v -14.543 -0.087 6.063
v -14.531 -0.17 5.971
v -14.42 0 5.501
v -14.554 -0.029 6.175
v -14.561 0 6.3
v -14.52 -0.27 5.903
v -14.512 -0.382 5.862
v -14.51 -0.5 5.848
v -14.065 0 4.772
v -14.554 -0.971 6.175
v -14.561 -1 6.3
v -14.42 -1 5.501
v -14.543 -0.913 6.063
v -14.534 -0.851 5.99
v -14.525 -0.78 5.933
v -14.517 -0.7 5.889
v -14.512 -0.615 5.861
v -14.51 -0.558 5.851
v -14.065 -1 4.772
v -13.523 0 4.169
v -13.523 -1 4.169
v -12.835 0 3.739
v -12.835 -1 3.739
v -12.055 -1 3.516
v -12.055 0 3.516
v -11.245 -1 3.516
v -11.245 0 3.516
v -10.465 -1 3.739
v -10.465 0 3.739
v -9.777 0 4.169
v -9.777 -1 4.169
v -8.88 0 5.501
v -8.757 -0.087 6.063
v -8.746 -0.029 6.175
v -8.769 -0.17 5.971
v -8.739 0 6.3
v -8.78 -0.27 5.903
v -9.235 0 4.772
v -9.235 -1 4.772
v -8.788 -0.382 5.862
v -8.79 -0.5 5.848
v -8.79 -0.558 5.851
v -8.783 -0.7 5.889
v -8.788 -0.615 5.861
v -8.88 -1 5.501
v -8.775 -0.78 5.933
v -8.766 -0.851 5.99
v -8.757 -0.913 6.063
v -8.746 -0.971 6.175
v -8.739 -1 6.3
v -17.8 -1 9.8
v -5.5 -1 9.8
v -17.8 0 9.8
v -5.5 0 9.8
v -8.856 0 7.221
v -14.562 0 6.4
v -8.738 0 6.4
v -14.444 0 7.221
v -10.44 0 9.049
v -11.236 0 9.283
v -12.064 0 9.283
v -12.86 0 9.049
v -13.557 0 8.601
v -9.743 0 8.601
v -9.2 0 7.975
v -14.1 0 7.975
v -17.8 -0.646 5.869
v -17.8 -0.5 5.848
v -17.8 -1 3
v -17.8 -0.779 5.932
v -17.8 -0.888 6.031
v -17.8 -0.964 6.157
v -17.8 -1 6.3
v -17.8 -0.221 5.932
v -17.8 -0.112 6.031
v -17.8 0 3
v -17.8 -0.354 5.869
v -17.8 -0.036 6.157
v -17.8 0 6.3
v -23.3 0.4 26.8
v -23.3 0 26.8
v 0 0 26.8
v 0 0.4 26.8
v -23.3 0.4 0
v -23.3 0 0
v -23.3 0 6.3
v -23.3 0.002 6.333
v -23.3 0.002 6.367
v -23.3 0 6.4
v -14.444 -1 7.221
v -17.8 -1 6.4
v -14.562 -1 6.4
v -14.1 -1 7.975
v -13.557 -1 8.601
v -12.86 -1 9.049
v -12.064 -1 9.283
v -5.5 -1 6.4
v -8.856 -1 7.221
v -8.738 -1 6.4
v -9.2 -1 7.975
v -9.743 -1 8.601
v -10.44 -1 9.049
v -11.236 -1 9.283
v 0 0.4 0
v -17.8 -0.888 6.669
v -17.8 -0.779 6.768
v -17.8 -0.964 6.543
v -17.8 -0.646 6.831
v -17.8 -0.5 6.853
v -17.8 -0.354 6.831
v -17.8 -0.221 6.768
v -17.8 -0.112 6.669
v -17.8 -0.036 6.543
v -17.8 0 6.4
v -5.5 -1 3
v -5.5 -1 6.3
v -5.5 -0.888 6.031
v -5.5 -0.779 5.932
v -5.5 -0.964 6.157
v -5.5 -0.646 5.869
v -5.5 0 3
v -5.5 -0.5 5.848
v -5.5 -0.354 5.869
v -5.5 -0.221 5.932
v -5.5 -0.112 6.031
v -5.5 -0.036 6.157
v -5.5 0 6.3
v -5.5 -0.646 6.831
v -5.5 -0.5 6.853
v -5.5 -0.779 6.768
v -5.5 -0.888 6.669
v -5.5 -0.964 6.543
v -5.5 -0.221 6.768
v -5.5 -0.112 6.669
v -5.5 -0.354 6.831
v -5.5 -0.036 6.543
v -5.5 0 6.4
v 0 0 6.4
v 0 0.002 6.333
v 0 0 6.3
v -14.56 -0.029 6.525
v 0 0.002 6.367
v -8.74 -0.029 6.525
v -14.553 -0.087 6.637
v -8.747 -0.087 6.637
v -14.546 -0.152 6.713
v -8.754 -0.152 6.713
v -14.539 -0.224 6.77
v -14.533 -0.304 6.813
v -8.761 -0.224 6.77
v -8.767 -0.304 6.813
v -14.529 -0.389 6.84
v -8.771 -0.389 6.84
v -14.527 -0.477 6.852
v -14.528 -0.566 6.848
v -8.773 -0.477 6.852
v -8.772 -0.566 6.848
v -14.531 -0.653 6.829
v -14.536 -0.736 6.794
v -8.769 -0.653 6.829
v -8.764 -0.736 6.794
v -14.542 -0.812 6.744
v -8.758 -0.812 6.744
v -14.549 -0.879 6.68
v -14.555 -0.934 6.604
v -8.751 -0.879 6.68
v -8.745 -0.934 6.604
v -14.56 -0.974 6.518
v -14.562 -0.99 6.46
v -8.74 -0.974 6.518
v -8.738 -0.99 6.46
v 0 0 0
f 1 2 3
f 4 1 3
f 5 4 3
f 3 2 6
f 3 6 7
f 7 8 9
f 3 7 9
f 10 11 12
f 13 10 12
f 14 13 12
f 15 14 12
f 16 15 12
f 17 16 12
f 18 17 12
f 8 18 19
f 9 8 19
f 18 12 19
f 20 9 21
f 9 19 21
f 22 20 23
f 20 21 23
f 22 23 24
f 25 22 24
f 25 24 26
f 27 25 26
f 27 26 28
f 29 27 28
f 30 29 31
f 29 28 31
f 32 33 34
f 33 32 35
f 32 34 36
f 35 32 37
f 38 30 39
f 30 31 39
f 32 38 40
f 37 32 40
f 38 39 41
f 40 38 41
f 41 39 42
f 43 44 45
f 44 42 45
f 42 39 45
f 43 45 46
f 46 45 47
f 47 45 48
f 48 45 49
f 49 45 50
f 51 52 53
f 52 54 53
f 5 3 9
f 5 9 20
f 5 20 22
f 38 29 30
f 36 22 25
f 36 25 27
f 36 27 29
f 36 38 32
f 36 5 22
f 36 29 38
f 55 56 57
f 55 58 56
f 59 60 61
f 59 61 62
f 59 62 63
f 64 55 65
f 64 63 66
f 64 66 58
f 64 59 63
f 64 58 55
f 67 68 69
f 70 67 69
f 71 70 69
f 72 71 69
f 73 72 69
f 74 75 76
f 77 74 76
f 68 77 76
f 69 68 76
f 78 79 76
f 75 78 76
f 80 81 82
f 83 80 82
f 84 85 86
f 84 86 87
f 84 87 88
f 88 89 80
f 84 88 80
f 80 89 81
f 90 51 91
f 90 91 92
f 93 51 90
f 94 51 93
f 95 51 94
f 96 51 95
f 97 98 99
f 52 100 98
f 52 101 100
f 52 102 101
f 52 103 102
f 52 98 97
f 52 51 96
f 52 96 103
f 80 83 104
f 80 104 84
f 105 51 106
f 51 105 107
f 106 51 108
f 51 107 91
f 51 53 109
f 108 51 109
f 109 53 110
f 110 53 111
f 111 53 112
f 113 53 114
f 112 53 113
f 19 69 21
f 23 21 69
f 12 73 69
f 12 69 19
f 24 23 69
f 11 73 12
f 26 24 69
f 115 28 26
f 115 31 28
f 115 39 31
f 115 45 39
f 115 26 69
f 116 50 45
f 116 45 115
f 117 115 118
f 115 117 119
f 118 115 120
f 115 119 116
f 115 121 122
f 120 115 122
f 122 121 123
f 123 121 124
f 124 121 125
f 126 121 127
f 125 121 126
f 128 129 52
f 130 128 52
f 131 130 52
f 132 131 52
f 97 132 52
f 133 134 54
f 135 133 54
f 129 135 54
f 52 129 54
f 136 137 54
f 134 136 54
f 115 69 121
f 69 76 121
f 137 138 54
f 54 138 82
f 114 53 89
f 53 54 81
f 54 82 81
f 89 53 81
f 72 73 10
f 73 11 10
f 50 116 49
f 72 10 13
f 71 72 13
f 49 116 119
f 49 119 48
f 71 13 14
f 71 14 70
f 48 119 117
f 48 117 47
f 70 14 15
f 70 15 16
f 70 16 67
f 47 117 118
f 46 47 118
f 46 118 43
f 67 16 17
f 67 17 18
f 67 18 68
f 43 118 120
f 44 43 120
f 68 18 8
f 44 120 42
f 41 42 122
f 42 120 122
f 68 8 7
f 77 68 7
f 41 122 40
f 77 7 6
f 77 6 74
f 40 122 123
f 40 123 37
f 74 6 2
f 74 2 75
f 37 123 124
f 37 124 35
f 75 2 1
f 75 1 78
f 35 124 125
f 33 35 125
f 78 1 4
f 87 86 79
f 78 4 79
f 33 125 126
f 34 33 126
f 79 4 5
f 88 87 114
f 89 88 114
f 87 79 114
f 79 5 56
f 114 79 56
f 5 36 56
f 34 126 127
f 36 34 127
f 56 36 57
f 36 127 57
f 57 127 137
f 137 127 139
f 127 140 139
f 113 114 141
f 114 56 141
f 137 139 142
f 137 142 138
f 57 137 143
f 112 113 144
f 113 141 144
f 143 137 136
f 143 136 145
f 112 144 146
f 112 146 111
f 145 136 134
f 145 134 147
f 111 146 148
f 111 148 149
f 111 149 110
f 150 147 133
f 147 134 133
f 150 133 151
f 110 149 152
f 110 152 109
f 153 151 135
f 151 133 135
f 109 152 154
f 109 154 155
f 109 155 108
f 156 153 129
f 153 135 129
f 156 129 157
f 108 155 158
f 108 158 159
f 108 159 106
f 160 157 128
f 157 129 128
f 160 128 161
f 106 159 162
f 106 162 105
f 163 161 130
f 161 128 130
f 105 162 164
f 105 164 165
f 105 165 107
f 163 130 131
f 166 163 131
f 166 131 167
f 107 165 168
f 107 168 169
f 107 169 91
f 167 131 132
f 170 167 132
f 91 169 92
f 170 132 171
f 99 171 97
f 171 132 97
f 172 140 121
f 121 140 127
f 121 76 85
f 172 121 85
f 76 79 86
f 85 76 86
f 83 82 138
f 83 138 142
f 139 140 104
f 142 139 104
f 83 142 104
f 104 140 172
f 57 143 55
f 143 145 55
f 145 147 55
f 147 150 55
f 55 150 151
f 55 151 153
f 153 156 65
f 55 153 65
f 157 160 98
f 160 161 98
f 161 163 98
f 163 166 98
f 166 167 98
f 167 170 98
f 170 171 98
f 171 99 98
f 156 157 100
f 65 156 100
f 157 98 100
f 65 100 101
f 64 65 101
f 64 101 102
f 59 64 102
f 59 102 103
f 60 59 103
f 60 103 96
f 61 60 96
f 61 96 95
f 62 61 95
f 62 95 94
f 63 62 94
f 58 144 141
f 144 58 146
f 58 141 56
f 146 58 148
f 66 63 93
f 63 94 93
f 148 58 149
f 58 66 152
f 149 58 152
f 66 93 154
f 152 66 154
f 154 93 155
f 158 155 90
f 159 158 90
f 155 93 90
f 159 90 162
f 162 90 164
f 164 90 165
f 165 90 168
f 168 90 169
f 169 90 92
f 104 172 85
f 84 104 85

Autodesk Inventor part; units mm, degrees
ref_plane "YZ Plane" through (0, 0, 0) normal (1, 0, 0) x (0, 1, 0)
ref_plane "XZ Plane" through (0, 0, 0) normal (0, 1, 0) x (-1, 0, 0)
ref_plane "XY Plane" through (0, 0, 0) normal (0, 0, 1) x (1, 0, 0)
sketch "Skizze1" plane through (0, 0, 0) normal (0, 1, 0) x (-1, 0, 0)
  line L0 (0, 0) -> (23.3, 0)
  line L1 (23.3, 0) -> (23.3, 26.8)
  line L2 (23.3, 26.8) -> (0, 26.8)
  line L3 (0, 26.8) -> (0, 0)
  dimension "d0" = 23.3
  dimension "d1" = 26.8
extrude "Extrusion1" add sketch "Skizze1" along normal blind 0.4
sketch "Skizze2" plane through (0, 0, 0) normal (0, -1, 0) x (1, 0, 0)
  line L0 (0, 0) -> (-23.3, 0) projected
  line L1 (0, 26.8) -> (0, 0) projected
  line L2 (-23.3, 26.8) -> (0, 26.8) projected
  line L3 (-23.3, 0) -> (-23.3, 26.8) projected
  line L4 (-17.8, 3) -> (-5.5, 3)
  line L5 (-5.5, 3) -> (-5.5, 9.8)
  line L6 (-5.5, 9.8) -> (-17.8, 9.8)
  line L7 (-17.8, 9.8) -> (-17.8, 3)
  dimension "d4" = 3
  dimension "d5" = 17
  dimension "d6" = 5.5
  dimension "d7" = 5.5
extrude "Extrusion2" add sketch "Skizze2" along normal blind 1 contours L7 L6 L5 L4
sketch "Skizze3" plane through (0, -1, 0) normal (0, -1, 0) x (1, 0, 0)
  line L0 (-17.8, 3) -> (-5.5, 3) projected
  line L1 (-5.5, 3) -> (-5.5, 9.8) projected
  line L2 (-5.5, 9.8) -> (-17.8, 9.8) projected
  line L3 (-17.8, 9.8) -> (-17.8, 3) projected
  circle A0 centre (-11.65, 6.4) radius 2.9125
  point P0 (0, 0)
extrude "Extrusion3" cut sketch "Skizze3" against normal blind 1 contours A0
ref_plane "Work Plane1" through (-11.65, 0, 0) normal (-1, 0, 0) x (0, 0, 1)
sketch "Sketch5" plane through (0, 0, 26.8) normal (1, 0, 0) x (0, 0, -1)
  line L0 (23.3125, -1) -> (23.3125, 0) projected
  line L1 (17.4875, -1) -> (17.4875, 0) projected
  circle A0 centre (20.4499, -0.5) radius 0.5025
  point P0 (26.8, 0)
extrude "Extrusion5" cut sketch "Sketch5" against normal through all
ref_plane "Work Plane3" through (-52.1328, -19.1011, -24.6499) normal (0, 1, 0) x (1, 0, 0)
sketch "Sketch6" plane through (-52.1328, -19.1011, -24.6499) normal (0, 1, 0) x (1, 0, 0)
  line L0 (46.6328, -31.0499) -> (52.1328, -31.0499) construction
  line L1 (52.1328, -51.4499) -> (52.1328, -31.0499) construction
  line L2 (28.8328, -51.4499) -> (52.1328, -51.4499) construction
  line L3 (28.8328, -31.0499) -> (28.8328, -51.4499) construction
  line L4 (28.8328, -31.0499) -> (34.3328, -31.0499) construction
  line L5 (34.3328, -31.0499) -> (34.3328, -34.4499) construction
  line L6 (34.3328, -34.4499) -> (46.6328, -34.4499) construction
  line L7 (46.6328, -34.4499) -> (46.6328, -31.0499) construction
  line L8 (6.9828, -36.0499) -> (6.9828, 22.8301) construction
  line L9 (46.6328, -31.5025) -> (34.3328, -31.5025) construction
  line L10 (-16.7355, -31.5025) -> (-33.6581, -41.2728) construction
  line L11 (-33.6581, -41.2728) -> (-33.6581, -21.7322) construction
  line L12 (-33.6581, -21.7322) -> (-16.7355, -31.5025) construction
  point P0 (52.1328, -24.6499)
  point P1 (-28.0172, -31.5025)
  dimension "d16" = 35
properties part number "02_Nanoscopy_Chip"
